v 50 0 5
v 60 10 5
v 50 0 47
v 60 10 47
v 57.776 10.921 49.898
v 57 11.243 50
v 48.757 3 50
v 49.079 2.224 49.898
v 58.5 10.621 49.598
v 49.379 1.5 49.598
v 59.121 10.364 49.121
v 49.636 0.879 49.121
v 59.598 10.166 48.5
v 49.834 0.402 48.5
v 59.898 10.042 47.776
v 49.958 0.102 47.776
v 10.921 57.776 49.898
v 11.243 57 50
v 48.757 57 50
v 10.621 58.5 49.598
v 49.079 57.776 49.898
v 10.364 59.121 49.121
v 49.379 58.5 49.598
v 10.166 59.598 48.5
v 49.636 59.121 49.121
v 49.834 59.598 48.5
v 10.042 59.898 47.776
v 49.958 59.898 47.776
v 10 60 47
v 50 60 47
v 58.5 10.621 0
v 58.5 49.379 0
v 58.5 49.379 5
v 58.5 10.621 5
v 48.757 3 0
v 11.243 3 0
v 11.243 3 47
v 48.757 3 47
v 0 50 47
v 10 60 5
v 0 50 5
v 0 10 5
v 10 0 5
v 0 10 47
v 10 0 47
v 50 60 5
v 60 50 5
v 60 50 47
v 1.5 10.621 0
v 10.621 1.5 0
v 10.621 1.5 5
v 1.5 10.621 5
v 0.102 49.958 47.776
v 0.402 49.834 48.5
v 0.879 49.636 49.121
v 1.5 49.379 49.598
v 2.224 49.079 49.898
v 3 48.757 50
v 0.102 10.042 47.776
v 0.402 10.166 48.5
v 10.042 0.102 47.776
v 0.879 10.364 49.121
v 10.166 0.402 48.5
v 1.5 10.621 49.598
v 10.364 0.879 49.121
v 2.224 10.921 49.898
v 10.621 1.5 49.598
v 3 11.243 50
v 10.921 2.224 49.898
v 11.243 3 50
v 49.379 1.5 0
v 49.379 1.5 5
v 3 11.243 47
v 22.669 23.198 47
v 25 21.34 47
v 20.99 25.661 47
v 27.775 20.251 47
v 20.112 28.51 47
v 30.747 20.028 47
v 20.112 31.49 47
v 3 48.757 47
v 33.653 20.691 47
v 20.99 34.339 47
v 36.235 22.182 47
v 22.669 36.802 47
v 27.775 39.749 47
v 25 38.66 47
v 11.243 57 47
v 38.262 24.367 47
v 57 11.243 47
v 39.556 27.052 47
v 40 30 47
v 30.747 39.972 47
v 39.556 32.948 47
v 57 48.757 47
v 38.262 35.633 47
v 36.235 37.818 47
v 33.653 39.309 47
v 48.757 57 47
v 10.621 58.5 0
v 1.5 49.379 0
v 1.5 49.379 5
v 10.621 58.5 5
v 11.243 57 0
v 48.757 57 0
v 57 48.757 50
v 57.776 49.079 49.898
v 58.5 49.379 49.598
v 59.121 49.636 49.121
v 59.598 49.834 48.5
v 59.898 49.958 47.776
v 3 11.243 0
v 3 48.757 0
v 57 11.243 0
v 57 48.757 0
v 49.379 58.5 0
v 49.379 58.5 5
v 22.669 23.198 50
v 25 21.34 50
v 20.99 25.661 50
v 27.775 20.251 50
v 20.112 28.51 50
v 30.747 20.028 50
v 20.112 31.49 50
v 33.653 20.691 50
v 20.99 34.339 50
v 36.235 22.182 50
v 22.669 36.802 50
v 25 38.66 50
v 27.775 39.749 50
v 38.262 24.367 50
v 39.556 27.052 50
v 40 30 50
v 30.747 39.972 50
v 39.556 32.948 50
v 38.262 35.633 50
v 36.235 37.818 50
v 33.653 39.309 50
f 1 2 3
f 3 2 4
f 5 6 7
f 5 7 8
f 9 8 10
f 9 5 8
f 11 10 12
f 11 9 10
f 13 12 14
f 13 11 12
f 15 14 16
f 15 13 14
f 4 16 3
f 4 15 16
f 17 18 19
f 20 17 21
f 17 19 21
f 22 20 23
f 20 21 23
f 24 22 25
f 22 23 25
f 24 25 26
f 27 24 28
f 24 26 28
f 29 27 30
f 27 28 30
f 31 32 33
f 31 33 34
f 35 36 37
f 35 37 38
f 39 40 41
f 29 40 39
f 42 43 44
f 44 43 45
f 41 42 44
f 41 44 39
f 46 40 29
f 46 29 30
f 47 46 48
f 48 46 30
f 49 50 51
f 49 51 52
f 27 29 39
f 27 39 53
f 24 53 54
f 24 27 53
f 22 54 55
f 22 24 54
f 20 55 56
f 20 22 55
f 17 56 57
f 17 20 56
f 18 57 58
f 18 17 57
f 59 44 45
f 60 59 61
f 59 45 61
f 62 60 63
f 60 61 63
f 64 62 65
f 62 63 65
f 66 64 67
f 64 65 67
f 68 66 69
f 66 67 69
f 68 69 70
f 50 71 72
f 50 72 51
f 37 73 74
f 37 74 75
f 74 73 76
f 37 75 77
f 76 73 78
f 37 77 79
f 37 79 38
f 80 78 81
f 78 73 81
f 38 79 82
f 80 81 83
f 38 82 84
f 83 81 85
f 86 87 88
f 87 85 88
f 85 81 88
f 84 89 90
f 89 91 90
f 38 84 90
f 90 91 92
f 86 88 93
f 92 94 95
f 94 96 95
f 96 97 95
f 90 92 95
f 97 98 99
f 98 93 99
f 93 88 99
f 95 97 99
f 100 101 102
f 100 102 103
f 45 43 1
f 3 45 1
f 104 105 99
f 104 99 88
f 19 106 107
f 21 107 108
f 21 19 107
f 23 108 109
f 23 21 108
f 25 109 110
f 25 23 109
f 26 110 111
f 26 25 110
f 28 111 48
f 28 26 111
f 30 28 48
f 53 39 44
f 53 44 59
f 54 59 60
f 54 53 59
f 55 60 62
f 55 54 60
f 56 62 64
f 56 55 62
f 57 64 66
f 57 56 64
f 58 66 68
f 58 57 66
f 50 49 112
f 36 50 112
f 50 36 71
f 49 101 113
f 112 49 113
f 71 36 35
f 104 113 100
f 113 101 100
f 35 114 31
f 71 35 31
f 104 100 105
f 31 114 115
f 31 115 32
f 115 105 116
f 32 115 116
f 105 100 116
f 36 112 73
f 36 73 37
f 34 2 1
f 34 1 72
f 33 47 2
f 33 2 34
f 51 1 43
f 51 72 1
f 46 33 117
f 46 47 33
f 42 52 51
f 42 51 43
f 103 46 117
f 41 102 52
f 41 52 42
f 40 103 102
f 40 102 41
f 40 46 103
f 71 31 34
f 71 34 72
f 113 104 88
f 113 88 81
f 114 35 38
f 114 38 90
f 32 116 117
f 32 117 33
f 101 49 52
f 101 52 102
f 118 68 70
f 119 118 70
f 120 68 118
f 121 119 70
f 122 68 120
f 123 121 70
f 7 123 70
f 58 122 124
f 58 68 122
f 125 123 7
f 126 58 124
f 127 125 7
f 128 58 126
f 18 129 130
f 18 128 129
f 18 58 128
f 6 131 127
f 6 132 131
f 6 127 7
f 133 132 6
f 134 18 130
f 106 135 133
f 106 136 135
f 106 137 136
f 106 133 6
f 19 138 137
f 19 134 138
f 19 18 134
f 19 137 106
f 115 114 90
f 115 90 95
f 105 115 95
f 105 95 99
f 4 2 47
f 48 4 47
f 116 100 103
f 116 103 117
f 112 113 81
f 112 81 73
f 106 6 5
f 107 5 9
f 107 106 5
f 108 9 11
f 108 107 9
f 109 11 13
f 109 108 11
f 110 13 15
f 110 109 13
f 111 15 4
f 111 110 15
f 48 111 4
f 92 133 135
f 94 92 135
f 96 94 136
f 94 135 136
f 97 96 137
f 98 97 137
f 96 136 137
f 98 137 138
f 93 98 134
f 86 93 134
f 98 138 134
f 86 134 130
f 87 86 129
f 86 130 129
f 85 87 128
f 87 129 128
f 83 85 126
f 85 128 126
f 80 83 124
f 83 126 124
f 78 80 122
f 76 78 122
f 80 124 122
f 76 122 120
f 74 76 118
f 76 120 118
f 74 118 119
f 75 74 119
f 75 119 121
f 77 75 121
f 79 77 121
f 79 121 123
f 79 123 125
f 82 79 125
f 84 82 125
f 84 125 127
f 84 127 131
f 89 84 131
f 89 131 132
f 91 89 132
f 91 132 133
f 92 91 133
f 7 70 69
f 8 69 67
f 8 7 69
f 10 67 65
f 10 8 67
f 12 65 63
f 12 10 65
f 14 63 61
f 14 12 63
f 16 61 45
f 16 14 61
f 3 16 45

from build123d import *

# Parameters (mm, degrees)
SKETCH1_W           = 60
SKETCH1_H           = 60
BOSS_EXTRUDE1_DEPTH = 50
CHAMFER1_SIZE       = 10
FILLET1_R           = 3
SHELL2_DEPTH        = 47
CUT_EXTRUDE1_REACH  = 100.489
SKETCH2_R           = 10
CUT_EXTRUDE2_DEPTH  = 5


# Read off the part's stored shape, not the designer's step: Shell2
with BuildPart() as part:
    # Sketch1 → Boss-Extrude1 (new body)
    with BuildSketch(Plane.XY):
        with Locations((30, 30)):
            Rectangle(SKETCH1_W, SKETCH1_H)
    extrude(amount=BOSS_EXTRUDE1_DEPTH)

    # Chamfer1
    chamfer1_edges = [part.edges().sort_by_distance(p)[0] for p in [
        (0, 60, 25),
        (60, 60, 25),
        (60, 0, 25),
        (0, 0, 25),
    ]]
    chamfer(chamfer1_edges, length=CHAMFER1_SIZE)

    # Fillet1
    fillet1_edges = [part.edges().sort_by_distance(p)[0] for p in [
        (0, 30, 50),
        (30, 60, 50),
        (30, 0, 50),
        (60, 30, 50),
        (55, 55, 50),
        (55, 5, 50),
        (5, 5, 50),
        (5, 55, 50),
    ]]
    fillet(fillet1_edges, radius=FILLET1_R)

    # Shell2 outline → Shell2 (cut)
    with BuildSketch(Plane.XY):
        Polygon((3, 48.757359313), (3, 11.242640687), (11.242640687, 3), (48.757359313, 3), (57, 11.242640687), (57, 48.757359313), (48.757359313, 57), (11.242640687, 57), align=None)
    extrude(amount=SHELL2_DEPTH, mode=Mode.SUBTRACT)

    # Sketch2 → Cut-Extrude1 (cut, up to next)
    with BuildSketch(Plane.XY.offset(50), mode=Mode.PRIVATE) as cut_extrude1_sk1:
        with Locations((30, 30)):
            Circle(SKETCH2_R)
    cut_extrude1_tool1 = extrude(cut_extrude1_sk1.sketch, amount=-CUT_EXTRUDE1_REACH, mode=Mode.PRIVATE) & part.part
    add(cut_extrude1_tool1.solids().sort_by_distance((30, 30, 50))[0], mode=Mode.SUBTRACT)

    # Sketch3 → Cut-Extrude2 (cut)
    with BuildSketch(Plane(origin=(0, 0, 0), x_dir=(-1, 0, 0), z_dir=(0, 0, -1))):
        Polygon((0, 10), (0, 50), (-10, 60), (-50, 60), (-60, 50), (-60, 10), (-50, 0), (-10, 0), align=None)
        Polygon((-1.5, 10.621320344), (-1.5, 49.378679656), (-10.621320344, 58.5), (-49.378679656, 58.5), (-58.5, 49.378679656), (-58.5, 10.621320344), (-49.378679656, 1.5), (-10.621320344, 1.5), align=None, mode=Mode.SUBTRACT)
    extrude(amount=-CUT_EXTRUDE2_DEPTH, mode=Mode.SUBTRACT)


solid = part.part
